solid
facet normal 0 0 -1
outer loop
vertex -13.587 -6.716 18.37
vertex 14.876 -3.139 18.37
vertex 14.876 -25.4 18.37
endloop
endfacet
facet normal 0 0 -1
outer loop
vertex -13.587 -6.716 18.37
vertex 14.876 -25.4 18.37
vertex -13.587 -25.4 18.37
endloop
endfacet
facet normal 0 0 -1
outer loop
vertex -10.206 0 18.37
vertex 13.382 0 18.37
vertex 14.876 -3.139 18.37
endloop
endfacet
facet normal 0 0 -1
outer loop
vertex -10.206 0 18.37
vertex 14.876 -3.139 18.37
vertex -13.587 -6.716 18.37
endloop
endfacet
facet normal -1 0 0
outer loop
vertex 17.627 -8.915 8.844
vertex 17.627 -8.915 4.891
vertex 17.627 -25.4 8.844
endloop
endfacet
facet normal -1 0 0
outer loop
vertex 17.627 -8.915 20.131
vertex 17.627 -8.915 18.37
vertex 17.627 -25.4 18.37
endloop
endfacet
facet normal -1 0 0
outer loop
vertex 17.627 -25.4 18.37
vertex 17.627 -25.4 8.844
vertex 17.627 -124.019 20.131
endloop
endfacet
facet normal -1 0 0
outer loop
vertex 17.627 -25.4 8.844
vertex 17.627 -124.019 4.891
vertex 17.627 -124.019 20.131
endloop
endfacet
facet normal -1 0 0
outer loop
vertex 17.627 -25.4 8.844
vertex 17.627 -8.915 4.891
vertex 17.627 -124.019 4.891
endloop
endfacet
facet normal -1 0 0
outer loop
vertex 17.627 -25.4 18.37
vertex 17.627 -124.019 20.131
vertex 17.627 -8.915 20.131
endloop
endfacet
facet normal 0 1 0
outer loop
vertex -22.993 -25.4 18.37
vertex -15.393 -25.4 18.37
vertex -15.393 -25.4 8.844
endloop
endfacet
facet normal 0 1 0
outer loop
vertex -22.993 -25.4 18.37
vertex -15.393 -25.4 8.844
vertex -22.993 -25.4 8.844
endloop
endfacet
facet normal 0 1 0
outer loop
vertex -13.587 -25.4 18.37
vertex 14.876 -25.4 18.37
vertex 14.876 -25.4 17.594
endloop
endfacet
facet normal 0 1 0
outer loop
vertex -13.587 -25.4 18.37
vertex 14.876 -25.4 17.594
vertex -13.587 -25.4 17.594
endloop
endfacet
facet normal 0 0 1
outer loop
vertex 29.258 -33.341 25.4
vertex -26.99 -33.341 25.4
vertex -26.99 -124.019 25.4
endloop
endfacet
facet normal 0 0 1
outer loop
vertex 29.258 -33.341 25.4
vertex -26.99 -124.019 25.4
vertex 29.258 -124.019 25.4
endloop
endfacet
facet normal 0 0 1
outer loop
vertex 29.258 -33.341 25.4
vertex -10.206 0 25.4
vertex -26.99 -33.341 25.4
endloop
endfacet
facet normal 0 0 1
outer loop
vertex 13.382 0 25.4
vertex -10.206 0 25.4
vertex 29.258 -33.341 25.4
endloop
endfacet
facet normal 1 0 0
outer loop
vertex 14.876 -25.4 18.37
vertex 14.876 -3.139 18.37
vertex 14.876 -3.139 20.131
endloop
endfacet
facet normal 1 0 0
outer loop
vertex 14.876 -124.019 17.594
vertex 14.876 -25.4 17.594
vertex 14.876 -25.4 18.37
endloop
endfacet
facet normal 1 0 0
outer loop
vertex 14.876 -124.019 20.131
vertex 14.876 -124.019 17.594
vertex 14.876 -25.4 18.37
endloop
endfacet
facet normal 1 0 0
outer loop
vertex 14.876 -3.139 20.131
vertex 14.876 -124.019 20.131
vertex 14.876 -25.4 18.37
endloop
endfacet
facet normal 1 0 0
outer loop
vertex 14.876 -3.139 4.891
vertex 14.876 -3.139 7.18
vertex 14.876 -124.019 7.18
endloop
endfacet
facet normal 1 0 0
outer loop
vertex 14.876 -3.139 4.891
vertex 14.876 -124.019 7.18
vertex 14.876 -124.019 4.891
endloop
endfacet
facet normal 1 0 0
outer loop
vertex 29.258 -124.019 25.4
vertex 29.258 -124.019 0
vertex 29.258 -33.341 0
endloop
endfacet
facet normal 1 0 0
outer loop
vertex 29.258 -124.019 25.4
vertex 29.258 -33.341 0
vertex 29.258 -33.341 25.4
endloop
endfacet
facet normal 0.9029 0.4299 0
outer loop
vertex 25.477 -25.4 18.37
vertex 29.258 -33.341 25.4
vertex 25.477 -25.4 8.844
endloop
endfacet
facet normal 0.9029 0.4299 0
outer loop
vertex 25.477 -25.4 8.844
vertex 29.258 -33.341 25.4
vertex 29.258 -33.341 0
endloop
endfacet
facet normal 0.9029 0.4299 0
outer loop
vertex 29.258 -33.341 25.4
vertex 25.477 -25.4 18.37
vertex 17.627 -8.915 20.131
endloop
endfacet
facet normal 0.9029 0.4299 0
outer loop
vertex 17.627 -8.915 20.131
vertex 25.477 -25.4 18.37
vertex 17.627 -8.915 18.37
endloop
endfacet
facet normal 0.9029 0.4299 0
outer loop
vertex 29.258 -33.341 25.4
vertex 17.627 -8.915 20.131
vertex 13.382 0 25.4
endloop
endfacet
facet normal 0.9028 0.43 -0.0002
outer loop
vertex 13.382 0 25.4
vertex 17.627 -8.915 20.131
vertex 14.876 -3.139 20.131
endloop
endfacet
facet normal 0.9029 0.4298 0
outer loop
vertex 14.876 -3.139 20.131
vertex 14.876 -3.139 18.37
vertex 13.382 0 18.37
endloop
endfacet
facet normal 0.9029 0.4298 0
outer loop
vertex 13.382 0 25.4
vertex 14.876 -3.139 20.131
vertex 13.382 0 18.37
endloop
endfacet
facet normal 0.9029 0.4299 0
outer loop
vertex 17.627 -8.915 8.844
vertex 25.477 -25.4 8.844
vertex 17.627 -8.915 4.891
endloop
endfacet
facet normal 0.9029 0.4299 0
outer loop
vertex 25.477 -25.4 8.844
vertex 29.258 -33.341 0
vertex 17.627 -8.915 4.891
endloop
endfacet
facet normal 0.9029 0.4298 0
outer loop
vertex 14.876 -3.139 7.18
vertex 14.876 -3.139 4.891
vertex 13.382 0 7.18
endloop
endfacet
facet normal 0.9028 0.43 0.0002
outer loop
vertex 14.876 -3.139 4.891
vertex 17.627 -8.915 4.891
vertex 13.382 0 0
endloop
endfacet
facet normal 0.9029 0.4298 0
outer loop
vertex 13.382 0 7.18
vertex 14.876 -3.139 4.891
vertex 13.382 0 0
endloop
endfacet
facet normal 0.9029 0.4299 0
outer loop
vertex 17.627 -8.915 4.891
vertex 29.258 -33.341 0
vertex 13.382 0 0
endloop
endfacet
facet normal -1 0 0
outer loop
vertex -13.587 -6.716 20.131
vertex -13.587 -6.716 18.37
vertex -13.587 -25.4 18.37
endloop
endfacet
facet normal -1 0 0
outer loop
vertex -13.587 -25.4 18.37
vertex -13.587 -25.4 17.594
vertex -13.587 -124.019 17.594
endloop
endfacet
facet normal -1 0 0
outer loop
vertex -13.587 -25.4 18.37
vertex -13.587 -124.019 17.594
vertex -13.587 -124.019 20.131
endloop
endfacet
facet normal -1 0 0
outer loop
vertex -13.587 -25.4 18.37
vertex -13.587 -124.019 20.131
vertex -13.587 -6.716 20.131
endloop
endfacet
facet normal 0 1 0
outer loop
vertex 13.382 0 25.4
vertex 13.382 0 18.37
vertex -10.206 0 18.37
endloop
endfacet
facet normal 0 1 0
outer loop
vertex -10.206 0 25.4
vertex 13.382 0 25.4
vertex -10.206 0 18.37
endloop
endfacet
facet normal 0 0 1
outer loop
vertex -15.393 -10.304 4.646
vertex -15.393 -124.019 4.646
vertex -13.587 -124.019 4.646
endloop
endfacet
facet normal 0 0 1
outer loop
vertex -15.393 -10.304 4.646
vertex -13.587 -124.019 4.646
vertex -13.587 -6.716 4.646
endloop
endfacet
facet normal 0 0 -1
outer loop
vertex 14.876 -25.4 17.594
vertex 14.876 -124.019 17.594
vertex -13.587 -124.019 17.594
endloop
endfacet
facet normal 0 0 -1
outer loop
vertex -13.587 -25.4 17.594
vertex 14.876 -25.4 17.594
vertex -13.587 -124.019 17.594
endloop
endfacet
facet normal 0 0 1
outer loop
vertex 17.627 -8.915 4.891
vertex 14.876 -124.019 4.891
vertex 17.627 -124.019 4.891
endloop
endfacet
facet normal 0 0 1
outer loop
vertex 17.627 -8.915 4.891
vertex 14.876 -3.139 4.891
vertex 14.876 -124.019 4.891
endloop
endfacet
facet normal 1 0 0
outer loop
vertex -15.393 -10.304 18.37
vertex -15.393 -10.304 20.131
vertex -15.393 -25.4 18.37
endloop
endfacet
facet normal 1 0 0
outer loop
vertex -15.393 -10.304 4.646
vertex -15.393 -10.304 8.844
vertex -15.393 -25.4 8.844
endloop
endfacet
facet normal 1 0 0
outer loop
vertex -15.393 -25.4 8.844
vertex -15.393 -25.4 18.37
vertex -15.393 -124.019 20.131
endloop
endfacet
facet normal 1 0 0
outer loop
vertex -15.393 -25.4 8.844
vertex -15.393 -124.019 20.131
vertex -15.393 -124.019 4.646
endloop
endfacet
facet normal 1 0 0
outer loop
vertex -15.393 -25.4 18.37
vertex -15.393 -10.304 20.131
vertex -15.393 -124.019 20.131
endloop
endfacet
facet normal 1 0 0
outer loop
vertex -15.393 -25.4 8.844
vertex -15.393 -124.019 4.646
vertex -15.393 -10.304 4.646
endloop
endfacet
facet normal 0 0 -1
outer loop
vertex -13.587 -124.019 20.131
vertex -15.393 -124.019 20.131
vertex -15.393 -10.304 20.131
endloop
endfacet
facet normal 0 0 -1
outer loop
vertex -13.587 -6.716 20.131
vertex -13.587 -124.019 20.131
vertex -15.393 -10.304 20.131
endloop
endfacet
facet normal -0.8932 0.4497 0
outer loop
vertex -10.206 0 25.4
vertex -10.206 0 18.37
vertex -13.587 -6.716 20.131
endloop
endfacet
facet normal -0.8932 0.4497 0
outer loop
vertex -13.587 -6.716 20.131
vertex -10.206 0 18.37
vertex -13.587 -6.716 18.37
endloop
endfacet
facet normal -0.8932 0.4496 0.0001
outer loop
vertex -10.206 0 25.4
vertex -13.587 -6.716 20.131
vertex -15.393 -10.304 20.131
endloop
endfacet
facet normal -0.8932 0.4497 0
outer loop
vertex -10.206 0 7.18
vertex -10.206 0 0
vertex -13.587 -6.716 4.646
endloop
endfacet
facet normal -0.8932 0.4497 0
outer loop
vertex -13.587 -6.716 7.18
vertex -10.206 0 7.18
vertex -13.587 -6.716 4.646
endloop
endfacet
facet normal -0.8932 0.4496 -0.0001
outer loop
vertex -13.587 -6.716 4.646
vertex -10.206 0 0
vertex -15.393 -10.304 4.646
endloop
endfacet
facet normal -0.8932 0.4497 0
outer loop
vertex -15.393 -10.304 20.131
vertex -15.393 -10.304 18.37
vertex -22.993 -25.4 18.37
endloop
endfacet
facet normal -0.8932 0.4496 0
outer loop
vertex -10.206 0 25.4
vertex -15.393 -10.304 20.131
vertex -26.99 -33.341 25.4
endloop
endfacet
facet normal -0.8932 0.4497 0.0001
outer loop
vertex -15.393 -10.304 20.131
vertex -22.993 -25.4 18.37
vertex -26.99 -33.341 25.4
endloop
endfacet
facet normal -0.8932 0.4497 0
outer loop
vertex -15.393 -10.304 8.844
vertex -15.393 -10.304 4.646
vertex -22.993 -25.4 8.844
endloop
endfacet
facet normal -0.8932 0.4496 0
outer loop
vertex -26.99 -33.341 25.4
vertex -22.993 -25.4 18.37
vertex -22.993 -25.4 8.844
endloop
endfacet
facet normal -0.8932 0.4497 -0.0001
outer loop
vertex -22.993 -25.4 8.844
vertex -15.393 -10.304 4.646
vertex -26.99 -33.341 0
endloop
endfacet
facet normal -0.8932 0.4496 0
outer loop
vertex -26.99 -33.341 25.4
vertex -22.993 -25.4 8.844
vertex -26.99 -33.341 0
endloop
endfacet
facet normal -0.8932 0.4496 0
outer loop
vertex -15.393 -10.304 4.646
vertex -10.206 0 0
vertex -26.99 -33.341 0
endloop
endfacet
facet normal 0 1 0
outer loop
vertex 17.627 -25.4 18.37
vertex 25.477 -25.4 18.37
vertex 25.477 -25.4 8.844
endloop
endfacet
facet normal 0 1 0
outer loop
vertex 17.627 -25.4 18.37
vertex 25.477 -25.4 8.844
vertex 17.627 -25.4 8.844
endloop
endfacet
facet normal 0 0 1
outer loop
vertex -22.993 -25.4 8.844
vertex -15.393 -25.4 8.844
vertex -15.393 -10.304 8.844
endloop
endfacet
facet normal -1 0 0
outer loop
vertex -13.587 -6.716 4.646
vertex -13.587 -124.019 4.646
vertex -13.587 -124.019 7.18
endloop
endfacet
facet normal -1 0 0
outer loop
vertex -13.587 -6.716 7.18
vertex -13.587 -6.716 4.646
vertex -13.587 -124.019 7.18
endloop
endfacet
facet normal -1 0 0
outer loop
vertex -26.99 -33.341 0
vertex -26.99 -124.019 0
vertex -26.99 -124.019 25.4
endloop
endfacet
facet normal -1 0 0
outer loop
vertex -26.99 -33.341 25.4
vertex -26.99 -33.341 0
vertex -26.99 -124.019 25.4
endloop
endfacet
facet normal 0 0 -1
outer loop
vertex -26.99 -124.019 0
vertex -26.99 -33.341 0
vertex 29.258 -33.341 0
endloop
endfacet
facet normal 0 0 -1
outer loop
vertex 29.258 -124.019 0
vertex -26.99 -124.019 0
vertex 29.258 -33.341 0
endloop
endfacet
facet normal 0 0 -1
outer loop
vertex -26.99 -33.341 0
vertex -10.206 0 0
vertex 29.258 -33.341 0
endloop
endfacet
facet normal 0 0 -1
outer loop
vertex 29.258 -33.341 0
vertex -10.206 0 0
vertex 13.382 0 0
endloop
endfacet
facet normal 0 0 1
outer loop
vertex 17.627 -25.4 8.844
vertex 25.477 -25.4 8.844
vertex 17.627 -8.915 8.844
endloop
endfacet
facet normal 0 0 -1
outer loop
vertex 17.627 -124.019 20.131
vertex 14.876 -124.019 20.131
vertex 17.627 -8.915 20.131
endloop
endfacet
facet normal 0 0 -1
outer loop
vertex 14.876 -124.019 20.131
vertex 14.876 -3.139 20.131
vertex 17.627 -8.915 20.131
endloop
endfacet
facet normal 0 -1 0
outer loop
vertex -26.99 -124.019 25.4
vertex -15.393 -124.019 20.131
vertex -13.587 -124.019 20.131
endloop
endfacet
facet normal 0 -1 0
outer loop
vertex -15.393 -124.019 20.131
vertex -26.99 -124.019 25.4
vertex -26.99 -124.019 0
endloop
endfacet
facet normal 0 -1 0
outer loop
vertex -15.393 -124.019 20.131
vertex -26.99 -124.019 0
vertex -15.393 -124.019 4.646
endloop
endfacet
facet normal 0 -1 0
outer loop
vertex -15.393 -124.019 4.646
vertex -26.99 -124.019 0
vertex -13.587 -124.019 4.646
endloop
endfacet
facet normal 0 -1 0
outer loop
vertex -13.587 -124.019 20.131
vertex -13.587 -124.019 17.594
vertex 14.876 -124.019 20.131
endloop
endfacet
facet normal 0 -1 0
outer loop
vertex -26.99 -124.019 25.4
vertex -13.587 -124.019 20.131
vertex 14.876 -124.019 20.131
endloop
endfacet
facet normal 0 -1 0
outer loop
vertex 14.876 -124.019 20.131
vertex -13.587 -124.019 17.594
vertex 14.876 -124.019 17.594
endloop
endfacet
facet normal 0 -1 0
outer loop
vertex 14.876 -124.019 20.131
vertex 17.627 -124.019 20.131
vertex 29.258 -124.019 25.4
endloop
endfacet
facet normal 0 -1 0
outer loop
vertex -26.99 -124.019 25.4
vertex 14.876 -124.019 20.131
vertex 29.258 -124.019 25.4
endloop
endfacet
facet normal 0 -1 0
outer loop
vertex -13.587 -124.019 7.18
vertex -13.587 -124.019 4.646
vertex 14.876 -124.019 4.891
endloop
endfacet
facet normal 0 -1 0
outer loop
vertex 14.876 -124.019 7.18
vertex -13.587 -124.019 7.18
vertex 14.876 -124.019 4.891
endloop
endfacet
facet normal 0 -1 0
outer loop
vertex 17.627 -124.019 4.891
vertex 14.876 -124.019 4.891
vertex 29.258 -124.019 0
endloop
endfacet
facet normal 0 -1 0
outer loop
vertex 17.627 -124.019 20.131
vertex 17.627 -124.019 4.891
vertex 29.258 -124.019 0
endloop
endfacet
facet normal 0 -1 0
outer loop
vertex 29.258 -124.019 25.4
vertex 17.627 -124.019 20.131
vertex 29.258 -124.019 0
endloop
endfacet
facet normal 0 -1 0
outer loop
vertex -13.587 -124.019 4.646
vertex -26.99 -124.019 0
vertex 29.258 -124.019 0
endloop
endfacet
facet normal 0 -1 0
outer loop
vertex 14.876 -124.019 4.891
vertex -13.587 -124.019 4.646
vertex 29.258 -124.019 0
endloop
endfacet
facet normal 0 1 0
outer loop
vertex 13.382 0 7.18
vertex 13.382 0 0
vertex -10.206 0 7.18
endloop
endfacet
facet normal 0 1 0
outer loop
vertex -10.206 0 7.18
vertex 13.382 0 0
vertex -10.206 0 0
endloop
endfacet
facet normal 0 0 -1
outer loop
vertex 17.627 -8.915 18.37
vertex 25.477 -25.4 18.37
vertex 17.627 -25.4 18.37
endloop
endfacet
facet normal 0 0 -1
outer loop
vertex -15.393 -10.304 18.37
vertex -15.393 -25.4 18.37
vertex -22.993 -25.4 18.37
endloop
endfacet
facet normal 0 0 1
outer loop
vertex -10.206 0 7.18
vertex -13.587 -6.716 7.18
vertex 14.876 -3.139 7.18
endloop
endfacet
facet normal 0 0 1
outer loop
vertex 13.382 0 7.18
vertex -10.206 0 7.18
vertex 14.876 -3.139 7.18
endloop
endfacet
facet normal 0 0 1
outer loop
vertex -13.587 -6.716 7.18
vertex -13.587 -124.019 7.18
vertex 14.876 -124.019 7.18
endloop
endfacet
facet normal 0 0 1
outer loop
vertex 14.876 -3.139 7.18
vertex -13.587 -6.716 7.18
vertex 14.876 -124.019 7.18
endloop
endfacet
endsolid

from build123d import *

# Parameters (mm, degrees)
F1_DEPTH = 25.4
F2_W     = 71.67115435
F2_H     = 9.5259128138
F3_DEPTH = 25.4
F4_DEPTH = 90.678
F5_W     = 2.7504333318
F5_H     = 2.2891710663
F5_H_2   = 10.414
F5_W_2   = 28.4633595034
F5_H_3   = 2.5368289337
F5_W_3   = 1.8062071648
F5_H_4   = 2.5342966719
F6_DEPTH = 254


with BuildPart() as f1:
    # F0 (on Top) → F1 (new body)
    with BuildSketch(Plane.XY):
        Polygon((13.3816469461, 0), (-10.2063324302, 0), (-26.9900802523, -33.3406925201), (29.2581655085, -33.3406925201), align=None)
    extrude(amount=F1_DEPTH)

    # F2 (on face) → F3 (cut)
    with BuildSketch(Plane(origin=(0, 0, 0), x_dir=(-1, 0, 0), z_dir=(0, 1, 0))):
        with Locations((-2.7216915041, 13.6072267778)):
            Rectangle(F2_W, F2_H)
    extrude(amount=-F3_DEPTH, mode=Mode.SUBTRACT)

    # F4 (add): a face of the model
    f4_faces = [f1.faces().sort_by_distance(p)[0] for p in [
        (1.1340426281, -33.3406925201, 12.7),
    ]]
    extrude(f4_faces, amount=F4_DEPTH)

    # F5 (on face) → F6 (cut)
    with BuildSketch(Plane.XZ.offset(124.0186925201)):
        with Locations((16.251562838, 6.0353870775)):
            Rectangle(F5_W, F5_H)
        with Locations((16.251562838, 12.3869726107)):
            Rectangle(F5_W, F5_H_2)
        with Locations((0.6446664204, 12.3869726107)):
            Rectangle(F5_W_2, F5_H_2)
        with Locations((16.251562838, 18.8623870775)):
            Rectangle(F5_W, F5_H_3)
        with Locations((-14.4901169138, 5.9128242747)):
            Rectangle(F5_W_3, F5_H_4)
        with Locations((-14.4901169138, 12.3869726107)):
            Rectangle(F5_W_3, F5_H_2)
        with Locations((-14.4901169138, 18.8623870775)):
            Rectangle(F5_W_3, F5_H_3)
    extrude(amount=-F6_DEPTH, mode=Mode.SUBTRACT)


solid = f1.part
